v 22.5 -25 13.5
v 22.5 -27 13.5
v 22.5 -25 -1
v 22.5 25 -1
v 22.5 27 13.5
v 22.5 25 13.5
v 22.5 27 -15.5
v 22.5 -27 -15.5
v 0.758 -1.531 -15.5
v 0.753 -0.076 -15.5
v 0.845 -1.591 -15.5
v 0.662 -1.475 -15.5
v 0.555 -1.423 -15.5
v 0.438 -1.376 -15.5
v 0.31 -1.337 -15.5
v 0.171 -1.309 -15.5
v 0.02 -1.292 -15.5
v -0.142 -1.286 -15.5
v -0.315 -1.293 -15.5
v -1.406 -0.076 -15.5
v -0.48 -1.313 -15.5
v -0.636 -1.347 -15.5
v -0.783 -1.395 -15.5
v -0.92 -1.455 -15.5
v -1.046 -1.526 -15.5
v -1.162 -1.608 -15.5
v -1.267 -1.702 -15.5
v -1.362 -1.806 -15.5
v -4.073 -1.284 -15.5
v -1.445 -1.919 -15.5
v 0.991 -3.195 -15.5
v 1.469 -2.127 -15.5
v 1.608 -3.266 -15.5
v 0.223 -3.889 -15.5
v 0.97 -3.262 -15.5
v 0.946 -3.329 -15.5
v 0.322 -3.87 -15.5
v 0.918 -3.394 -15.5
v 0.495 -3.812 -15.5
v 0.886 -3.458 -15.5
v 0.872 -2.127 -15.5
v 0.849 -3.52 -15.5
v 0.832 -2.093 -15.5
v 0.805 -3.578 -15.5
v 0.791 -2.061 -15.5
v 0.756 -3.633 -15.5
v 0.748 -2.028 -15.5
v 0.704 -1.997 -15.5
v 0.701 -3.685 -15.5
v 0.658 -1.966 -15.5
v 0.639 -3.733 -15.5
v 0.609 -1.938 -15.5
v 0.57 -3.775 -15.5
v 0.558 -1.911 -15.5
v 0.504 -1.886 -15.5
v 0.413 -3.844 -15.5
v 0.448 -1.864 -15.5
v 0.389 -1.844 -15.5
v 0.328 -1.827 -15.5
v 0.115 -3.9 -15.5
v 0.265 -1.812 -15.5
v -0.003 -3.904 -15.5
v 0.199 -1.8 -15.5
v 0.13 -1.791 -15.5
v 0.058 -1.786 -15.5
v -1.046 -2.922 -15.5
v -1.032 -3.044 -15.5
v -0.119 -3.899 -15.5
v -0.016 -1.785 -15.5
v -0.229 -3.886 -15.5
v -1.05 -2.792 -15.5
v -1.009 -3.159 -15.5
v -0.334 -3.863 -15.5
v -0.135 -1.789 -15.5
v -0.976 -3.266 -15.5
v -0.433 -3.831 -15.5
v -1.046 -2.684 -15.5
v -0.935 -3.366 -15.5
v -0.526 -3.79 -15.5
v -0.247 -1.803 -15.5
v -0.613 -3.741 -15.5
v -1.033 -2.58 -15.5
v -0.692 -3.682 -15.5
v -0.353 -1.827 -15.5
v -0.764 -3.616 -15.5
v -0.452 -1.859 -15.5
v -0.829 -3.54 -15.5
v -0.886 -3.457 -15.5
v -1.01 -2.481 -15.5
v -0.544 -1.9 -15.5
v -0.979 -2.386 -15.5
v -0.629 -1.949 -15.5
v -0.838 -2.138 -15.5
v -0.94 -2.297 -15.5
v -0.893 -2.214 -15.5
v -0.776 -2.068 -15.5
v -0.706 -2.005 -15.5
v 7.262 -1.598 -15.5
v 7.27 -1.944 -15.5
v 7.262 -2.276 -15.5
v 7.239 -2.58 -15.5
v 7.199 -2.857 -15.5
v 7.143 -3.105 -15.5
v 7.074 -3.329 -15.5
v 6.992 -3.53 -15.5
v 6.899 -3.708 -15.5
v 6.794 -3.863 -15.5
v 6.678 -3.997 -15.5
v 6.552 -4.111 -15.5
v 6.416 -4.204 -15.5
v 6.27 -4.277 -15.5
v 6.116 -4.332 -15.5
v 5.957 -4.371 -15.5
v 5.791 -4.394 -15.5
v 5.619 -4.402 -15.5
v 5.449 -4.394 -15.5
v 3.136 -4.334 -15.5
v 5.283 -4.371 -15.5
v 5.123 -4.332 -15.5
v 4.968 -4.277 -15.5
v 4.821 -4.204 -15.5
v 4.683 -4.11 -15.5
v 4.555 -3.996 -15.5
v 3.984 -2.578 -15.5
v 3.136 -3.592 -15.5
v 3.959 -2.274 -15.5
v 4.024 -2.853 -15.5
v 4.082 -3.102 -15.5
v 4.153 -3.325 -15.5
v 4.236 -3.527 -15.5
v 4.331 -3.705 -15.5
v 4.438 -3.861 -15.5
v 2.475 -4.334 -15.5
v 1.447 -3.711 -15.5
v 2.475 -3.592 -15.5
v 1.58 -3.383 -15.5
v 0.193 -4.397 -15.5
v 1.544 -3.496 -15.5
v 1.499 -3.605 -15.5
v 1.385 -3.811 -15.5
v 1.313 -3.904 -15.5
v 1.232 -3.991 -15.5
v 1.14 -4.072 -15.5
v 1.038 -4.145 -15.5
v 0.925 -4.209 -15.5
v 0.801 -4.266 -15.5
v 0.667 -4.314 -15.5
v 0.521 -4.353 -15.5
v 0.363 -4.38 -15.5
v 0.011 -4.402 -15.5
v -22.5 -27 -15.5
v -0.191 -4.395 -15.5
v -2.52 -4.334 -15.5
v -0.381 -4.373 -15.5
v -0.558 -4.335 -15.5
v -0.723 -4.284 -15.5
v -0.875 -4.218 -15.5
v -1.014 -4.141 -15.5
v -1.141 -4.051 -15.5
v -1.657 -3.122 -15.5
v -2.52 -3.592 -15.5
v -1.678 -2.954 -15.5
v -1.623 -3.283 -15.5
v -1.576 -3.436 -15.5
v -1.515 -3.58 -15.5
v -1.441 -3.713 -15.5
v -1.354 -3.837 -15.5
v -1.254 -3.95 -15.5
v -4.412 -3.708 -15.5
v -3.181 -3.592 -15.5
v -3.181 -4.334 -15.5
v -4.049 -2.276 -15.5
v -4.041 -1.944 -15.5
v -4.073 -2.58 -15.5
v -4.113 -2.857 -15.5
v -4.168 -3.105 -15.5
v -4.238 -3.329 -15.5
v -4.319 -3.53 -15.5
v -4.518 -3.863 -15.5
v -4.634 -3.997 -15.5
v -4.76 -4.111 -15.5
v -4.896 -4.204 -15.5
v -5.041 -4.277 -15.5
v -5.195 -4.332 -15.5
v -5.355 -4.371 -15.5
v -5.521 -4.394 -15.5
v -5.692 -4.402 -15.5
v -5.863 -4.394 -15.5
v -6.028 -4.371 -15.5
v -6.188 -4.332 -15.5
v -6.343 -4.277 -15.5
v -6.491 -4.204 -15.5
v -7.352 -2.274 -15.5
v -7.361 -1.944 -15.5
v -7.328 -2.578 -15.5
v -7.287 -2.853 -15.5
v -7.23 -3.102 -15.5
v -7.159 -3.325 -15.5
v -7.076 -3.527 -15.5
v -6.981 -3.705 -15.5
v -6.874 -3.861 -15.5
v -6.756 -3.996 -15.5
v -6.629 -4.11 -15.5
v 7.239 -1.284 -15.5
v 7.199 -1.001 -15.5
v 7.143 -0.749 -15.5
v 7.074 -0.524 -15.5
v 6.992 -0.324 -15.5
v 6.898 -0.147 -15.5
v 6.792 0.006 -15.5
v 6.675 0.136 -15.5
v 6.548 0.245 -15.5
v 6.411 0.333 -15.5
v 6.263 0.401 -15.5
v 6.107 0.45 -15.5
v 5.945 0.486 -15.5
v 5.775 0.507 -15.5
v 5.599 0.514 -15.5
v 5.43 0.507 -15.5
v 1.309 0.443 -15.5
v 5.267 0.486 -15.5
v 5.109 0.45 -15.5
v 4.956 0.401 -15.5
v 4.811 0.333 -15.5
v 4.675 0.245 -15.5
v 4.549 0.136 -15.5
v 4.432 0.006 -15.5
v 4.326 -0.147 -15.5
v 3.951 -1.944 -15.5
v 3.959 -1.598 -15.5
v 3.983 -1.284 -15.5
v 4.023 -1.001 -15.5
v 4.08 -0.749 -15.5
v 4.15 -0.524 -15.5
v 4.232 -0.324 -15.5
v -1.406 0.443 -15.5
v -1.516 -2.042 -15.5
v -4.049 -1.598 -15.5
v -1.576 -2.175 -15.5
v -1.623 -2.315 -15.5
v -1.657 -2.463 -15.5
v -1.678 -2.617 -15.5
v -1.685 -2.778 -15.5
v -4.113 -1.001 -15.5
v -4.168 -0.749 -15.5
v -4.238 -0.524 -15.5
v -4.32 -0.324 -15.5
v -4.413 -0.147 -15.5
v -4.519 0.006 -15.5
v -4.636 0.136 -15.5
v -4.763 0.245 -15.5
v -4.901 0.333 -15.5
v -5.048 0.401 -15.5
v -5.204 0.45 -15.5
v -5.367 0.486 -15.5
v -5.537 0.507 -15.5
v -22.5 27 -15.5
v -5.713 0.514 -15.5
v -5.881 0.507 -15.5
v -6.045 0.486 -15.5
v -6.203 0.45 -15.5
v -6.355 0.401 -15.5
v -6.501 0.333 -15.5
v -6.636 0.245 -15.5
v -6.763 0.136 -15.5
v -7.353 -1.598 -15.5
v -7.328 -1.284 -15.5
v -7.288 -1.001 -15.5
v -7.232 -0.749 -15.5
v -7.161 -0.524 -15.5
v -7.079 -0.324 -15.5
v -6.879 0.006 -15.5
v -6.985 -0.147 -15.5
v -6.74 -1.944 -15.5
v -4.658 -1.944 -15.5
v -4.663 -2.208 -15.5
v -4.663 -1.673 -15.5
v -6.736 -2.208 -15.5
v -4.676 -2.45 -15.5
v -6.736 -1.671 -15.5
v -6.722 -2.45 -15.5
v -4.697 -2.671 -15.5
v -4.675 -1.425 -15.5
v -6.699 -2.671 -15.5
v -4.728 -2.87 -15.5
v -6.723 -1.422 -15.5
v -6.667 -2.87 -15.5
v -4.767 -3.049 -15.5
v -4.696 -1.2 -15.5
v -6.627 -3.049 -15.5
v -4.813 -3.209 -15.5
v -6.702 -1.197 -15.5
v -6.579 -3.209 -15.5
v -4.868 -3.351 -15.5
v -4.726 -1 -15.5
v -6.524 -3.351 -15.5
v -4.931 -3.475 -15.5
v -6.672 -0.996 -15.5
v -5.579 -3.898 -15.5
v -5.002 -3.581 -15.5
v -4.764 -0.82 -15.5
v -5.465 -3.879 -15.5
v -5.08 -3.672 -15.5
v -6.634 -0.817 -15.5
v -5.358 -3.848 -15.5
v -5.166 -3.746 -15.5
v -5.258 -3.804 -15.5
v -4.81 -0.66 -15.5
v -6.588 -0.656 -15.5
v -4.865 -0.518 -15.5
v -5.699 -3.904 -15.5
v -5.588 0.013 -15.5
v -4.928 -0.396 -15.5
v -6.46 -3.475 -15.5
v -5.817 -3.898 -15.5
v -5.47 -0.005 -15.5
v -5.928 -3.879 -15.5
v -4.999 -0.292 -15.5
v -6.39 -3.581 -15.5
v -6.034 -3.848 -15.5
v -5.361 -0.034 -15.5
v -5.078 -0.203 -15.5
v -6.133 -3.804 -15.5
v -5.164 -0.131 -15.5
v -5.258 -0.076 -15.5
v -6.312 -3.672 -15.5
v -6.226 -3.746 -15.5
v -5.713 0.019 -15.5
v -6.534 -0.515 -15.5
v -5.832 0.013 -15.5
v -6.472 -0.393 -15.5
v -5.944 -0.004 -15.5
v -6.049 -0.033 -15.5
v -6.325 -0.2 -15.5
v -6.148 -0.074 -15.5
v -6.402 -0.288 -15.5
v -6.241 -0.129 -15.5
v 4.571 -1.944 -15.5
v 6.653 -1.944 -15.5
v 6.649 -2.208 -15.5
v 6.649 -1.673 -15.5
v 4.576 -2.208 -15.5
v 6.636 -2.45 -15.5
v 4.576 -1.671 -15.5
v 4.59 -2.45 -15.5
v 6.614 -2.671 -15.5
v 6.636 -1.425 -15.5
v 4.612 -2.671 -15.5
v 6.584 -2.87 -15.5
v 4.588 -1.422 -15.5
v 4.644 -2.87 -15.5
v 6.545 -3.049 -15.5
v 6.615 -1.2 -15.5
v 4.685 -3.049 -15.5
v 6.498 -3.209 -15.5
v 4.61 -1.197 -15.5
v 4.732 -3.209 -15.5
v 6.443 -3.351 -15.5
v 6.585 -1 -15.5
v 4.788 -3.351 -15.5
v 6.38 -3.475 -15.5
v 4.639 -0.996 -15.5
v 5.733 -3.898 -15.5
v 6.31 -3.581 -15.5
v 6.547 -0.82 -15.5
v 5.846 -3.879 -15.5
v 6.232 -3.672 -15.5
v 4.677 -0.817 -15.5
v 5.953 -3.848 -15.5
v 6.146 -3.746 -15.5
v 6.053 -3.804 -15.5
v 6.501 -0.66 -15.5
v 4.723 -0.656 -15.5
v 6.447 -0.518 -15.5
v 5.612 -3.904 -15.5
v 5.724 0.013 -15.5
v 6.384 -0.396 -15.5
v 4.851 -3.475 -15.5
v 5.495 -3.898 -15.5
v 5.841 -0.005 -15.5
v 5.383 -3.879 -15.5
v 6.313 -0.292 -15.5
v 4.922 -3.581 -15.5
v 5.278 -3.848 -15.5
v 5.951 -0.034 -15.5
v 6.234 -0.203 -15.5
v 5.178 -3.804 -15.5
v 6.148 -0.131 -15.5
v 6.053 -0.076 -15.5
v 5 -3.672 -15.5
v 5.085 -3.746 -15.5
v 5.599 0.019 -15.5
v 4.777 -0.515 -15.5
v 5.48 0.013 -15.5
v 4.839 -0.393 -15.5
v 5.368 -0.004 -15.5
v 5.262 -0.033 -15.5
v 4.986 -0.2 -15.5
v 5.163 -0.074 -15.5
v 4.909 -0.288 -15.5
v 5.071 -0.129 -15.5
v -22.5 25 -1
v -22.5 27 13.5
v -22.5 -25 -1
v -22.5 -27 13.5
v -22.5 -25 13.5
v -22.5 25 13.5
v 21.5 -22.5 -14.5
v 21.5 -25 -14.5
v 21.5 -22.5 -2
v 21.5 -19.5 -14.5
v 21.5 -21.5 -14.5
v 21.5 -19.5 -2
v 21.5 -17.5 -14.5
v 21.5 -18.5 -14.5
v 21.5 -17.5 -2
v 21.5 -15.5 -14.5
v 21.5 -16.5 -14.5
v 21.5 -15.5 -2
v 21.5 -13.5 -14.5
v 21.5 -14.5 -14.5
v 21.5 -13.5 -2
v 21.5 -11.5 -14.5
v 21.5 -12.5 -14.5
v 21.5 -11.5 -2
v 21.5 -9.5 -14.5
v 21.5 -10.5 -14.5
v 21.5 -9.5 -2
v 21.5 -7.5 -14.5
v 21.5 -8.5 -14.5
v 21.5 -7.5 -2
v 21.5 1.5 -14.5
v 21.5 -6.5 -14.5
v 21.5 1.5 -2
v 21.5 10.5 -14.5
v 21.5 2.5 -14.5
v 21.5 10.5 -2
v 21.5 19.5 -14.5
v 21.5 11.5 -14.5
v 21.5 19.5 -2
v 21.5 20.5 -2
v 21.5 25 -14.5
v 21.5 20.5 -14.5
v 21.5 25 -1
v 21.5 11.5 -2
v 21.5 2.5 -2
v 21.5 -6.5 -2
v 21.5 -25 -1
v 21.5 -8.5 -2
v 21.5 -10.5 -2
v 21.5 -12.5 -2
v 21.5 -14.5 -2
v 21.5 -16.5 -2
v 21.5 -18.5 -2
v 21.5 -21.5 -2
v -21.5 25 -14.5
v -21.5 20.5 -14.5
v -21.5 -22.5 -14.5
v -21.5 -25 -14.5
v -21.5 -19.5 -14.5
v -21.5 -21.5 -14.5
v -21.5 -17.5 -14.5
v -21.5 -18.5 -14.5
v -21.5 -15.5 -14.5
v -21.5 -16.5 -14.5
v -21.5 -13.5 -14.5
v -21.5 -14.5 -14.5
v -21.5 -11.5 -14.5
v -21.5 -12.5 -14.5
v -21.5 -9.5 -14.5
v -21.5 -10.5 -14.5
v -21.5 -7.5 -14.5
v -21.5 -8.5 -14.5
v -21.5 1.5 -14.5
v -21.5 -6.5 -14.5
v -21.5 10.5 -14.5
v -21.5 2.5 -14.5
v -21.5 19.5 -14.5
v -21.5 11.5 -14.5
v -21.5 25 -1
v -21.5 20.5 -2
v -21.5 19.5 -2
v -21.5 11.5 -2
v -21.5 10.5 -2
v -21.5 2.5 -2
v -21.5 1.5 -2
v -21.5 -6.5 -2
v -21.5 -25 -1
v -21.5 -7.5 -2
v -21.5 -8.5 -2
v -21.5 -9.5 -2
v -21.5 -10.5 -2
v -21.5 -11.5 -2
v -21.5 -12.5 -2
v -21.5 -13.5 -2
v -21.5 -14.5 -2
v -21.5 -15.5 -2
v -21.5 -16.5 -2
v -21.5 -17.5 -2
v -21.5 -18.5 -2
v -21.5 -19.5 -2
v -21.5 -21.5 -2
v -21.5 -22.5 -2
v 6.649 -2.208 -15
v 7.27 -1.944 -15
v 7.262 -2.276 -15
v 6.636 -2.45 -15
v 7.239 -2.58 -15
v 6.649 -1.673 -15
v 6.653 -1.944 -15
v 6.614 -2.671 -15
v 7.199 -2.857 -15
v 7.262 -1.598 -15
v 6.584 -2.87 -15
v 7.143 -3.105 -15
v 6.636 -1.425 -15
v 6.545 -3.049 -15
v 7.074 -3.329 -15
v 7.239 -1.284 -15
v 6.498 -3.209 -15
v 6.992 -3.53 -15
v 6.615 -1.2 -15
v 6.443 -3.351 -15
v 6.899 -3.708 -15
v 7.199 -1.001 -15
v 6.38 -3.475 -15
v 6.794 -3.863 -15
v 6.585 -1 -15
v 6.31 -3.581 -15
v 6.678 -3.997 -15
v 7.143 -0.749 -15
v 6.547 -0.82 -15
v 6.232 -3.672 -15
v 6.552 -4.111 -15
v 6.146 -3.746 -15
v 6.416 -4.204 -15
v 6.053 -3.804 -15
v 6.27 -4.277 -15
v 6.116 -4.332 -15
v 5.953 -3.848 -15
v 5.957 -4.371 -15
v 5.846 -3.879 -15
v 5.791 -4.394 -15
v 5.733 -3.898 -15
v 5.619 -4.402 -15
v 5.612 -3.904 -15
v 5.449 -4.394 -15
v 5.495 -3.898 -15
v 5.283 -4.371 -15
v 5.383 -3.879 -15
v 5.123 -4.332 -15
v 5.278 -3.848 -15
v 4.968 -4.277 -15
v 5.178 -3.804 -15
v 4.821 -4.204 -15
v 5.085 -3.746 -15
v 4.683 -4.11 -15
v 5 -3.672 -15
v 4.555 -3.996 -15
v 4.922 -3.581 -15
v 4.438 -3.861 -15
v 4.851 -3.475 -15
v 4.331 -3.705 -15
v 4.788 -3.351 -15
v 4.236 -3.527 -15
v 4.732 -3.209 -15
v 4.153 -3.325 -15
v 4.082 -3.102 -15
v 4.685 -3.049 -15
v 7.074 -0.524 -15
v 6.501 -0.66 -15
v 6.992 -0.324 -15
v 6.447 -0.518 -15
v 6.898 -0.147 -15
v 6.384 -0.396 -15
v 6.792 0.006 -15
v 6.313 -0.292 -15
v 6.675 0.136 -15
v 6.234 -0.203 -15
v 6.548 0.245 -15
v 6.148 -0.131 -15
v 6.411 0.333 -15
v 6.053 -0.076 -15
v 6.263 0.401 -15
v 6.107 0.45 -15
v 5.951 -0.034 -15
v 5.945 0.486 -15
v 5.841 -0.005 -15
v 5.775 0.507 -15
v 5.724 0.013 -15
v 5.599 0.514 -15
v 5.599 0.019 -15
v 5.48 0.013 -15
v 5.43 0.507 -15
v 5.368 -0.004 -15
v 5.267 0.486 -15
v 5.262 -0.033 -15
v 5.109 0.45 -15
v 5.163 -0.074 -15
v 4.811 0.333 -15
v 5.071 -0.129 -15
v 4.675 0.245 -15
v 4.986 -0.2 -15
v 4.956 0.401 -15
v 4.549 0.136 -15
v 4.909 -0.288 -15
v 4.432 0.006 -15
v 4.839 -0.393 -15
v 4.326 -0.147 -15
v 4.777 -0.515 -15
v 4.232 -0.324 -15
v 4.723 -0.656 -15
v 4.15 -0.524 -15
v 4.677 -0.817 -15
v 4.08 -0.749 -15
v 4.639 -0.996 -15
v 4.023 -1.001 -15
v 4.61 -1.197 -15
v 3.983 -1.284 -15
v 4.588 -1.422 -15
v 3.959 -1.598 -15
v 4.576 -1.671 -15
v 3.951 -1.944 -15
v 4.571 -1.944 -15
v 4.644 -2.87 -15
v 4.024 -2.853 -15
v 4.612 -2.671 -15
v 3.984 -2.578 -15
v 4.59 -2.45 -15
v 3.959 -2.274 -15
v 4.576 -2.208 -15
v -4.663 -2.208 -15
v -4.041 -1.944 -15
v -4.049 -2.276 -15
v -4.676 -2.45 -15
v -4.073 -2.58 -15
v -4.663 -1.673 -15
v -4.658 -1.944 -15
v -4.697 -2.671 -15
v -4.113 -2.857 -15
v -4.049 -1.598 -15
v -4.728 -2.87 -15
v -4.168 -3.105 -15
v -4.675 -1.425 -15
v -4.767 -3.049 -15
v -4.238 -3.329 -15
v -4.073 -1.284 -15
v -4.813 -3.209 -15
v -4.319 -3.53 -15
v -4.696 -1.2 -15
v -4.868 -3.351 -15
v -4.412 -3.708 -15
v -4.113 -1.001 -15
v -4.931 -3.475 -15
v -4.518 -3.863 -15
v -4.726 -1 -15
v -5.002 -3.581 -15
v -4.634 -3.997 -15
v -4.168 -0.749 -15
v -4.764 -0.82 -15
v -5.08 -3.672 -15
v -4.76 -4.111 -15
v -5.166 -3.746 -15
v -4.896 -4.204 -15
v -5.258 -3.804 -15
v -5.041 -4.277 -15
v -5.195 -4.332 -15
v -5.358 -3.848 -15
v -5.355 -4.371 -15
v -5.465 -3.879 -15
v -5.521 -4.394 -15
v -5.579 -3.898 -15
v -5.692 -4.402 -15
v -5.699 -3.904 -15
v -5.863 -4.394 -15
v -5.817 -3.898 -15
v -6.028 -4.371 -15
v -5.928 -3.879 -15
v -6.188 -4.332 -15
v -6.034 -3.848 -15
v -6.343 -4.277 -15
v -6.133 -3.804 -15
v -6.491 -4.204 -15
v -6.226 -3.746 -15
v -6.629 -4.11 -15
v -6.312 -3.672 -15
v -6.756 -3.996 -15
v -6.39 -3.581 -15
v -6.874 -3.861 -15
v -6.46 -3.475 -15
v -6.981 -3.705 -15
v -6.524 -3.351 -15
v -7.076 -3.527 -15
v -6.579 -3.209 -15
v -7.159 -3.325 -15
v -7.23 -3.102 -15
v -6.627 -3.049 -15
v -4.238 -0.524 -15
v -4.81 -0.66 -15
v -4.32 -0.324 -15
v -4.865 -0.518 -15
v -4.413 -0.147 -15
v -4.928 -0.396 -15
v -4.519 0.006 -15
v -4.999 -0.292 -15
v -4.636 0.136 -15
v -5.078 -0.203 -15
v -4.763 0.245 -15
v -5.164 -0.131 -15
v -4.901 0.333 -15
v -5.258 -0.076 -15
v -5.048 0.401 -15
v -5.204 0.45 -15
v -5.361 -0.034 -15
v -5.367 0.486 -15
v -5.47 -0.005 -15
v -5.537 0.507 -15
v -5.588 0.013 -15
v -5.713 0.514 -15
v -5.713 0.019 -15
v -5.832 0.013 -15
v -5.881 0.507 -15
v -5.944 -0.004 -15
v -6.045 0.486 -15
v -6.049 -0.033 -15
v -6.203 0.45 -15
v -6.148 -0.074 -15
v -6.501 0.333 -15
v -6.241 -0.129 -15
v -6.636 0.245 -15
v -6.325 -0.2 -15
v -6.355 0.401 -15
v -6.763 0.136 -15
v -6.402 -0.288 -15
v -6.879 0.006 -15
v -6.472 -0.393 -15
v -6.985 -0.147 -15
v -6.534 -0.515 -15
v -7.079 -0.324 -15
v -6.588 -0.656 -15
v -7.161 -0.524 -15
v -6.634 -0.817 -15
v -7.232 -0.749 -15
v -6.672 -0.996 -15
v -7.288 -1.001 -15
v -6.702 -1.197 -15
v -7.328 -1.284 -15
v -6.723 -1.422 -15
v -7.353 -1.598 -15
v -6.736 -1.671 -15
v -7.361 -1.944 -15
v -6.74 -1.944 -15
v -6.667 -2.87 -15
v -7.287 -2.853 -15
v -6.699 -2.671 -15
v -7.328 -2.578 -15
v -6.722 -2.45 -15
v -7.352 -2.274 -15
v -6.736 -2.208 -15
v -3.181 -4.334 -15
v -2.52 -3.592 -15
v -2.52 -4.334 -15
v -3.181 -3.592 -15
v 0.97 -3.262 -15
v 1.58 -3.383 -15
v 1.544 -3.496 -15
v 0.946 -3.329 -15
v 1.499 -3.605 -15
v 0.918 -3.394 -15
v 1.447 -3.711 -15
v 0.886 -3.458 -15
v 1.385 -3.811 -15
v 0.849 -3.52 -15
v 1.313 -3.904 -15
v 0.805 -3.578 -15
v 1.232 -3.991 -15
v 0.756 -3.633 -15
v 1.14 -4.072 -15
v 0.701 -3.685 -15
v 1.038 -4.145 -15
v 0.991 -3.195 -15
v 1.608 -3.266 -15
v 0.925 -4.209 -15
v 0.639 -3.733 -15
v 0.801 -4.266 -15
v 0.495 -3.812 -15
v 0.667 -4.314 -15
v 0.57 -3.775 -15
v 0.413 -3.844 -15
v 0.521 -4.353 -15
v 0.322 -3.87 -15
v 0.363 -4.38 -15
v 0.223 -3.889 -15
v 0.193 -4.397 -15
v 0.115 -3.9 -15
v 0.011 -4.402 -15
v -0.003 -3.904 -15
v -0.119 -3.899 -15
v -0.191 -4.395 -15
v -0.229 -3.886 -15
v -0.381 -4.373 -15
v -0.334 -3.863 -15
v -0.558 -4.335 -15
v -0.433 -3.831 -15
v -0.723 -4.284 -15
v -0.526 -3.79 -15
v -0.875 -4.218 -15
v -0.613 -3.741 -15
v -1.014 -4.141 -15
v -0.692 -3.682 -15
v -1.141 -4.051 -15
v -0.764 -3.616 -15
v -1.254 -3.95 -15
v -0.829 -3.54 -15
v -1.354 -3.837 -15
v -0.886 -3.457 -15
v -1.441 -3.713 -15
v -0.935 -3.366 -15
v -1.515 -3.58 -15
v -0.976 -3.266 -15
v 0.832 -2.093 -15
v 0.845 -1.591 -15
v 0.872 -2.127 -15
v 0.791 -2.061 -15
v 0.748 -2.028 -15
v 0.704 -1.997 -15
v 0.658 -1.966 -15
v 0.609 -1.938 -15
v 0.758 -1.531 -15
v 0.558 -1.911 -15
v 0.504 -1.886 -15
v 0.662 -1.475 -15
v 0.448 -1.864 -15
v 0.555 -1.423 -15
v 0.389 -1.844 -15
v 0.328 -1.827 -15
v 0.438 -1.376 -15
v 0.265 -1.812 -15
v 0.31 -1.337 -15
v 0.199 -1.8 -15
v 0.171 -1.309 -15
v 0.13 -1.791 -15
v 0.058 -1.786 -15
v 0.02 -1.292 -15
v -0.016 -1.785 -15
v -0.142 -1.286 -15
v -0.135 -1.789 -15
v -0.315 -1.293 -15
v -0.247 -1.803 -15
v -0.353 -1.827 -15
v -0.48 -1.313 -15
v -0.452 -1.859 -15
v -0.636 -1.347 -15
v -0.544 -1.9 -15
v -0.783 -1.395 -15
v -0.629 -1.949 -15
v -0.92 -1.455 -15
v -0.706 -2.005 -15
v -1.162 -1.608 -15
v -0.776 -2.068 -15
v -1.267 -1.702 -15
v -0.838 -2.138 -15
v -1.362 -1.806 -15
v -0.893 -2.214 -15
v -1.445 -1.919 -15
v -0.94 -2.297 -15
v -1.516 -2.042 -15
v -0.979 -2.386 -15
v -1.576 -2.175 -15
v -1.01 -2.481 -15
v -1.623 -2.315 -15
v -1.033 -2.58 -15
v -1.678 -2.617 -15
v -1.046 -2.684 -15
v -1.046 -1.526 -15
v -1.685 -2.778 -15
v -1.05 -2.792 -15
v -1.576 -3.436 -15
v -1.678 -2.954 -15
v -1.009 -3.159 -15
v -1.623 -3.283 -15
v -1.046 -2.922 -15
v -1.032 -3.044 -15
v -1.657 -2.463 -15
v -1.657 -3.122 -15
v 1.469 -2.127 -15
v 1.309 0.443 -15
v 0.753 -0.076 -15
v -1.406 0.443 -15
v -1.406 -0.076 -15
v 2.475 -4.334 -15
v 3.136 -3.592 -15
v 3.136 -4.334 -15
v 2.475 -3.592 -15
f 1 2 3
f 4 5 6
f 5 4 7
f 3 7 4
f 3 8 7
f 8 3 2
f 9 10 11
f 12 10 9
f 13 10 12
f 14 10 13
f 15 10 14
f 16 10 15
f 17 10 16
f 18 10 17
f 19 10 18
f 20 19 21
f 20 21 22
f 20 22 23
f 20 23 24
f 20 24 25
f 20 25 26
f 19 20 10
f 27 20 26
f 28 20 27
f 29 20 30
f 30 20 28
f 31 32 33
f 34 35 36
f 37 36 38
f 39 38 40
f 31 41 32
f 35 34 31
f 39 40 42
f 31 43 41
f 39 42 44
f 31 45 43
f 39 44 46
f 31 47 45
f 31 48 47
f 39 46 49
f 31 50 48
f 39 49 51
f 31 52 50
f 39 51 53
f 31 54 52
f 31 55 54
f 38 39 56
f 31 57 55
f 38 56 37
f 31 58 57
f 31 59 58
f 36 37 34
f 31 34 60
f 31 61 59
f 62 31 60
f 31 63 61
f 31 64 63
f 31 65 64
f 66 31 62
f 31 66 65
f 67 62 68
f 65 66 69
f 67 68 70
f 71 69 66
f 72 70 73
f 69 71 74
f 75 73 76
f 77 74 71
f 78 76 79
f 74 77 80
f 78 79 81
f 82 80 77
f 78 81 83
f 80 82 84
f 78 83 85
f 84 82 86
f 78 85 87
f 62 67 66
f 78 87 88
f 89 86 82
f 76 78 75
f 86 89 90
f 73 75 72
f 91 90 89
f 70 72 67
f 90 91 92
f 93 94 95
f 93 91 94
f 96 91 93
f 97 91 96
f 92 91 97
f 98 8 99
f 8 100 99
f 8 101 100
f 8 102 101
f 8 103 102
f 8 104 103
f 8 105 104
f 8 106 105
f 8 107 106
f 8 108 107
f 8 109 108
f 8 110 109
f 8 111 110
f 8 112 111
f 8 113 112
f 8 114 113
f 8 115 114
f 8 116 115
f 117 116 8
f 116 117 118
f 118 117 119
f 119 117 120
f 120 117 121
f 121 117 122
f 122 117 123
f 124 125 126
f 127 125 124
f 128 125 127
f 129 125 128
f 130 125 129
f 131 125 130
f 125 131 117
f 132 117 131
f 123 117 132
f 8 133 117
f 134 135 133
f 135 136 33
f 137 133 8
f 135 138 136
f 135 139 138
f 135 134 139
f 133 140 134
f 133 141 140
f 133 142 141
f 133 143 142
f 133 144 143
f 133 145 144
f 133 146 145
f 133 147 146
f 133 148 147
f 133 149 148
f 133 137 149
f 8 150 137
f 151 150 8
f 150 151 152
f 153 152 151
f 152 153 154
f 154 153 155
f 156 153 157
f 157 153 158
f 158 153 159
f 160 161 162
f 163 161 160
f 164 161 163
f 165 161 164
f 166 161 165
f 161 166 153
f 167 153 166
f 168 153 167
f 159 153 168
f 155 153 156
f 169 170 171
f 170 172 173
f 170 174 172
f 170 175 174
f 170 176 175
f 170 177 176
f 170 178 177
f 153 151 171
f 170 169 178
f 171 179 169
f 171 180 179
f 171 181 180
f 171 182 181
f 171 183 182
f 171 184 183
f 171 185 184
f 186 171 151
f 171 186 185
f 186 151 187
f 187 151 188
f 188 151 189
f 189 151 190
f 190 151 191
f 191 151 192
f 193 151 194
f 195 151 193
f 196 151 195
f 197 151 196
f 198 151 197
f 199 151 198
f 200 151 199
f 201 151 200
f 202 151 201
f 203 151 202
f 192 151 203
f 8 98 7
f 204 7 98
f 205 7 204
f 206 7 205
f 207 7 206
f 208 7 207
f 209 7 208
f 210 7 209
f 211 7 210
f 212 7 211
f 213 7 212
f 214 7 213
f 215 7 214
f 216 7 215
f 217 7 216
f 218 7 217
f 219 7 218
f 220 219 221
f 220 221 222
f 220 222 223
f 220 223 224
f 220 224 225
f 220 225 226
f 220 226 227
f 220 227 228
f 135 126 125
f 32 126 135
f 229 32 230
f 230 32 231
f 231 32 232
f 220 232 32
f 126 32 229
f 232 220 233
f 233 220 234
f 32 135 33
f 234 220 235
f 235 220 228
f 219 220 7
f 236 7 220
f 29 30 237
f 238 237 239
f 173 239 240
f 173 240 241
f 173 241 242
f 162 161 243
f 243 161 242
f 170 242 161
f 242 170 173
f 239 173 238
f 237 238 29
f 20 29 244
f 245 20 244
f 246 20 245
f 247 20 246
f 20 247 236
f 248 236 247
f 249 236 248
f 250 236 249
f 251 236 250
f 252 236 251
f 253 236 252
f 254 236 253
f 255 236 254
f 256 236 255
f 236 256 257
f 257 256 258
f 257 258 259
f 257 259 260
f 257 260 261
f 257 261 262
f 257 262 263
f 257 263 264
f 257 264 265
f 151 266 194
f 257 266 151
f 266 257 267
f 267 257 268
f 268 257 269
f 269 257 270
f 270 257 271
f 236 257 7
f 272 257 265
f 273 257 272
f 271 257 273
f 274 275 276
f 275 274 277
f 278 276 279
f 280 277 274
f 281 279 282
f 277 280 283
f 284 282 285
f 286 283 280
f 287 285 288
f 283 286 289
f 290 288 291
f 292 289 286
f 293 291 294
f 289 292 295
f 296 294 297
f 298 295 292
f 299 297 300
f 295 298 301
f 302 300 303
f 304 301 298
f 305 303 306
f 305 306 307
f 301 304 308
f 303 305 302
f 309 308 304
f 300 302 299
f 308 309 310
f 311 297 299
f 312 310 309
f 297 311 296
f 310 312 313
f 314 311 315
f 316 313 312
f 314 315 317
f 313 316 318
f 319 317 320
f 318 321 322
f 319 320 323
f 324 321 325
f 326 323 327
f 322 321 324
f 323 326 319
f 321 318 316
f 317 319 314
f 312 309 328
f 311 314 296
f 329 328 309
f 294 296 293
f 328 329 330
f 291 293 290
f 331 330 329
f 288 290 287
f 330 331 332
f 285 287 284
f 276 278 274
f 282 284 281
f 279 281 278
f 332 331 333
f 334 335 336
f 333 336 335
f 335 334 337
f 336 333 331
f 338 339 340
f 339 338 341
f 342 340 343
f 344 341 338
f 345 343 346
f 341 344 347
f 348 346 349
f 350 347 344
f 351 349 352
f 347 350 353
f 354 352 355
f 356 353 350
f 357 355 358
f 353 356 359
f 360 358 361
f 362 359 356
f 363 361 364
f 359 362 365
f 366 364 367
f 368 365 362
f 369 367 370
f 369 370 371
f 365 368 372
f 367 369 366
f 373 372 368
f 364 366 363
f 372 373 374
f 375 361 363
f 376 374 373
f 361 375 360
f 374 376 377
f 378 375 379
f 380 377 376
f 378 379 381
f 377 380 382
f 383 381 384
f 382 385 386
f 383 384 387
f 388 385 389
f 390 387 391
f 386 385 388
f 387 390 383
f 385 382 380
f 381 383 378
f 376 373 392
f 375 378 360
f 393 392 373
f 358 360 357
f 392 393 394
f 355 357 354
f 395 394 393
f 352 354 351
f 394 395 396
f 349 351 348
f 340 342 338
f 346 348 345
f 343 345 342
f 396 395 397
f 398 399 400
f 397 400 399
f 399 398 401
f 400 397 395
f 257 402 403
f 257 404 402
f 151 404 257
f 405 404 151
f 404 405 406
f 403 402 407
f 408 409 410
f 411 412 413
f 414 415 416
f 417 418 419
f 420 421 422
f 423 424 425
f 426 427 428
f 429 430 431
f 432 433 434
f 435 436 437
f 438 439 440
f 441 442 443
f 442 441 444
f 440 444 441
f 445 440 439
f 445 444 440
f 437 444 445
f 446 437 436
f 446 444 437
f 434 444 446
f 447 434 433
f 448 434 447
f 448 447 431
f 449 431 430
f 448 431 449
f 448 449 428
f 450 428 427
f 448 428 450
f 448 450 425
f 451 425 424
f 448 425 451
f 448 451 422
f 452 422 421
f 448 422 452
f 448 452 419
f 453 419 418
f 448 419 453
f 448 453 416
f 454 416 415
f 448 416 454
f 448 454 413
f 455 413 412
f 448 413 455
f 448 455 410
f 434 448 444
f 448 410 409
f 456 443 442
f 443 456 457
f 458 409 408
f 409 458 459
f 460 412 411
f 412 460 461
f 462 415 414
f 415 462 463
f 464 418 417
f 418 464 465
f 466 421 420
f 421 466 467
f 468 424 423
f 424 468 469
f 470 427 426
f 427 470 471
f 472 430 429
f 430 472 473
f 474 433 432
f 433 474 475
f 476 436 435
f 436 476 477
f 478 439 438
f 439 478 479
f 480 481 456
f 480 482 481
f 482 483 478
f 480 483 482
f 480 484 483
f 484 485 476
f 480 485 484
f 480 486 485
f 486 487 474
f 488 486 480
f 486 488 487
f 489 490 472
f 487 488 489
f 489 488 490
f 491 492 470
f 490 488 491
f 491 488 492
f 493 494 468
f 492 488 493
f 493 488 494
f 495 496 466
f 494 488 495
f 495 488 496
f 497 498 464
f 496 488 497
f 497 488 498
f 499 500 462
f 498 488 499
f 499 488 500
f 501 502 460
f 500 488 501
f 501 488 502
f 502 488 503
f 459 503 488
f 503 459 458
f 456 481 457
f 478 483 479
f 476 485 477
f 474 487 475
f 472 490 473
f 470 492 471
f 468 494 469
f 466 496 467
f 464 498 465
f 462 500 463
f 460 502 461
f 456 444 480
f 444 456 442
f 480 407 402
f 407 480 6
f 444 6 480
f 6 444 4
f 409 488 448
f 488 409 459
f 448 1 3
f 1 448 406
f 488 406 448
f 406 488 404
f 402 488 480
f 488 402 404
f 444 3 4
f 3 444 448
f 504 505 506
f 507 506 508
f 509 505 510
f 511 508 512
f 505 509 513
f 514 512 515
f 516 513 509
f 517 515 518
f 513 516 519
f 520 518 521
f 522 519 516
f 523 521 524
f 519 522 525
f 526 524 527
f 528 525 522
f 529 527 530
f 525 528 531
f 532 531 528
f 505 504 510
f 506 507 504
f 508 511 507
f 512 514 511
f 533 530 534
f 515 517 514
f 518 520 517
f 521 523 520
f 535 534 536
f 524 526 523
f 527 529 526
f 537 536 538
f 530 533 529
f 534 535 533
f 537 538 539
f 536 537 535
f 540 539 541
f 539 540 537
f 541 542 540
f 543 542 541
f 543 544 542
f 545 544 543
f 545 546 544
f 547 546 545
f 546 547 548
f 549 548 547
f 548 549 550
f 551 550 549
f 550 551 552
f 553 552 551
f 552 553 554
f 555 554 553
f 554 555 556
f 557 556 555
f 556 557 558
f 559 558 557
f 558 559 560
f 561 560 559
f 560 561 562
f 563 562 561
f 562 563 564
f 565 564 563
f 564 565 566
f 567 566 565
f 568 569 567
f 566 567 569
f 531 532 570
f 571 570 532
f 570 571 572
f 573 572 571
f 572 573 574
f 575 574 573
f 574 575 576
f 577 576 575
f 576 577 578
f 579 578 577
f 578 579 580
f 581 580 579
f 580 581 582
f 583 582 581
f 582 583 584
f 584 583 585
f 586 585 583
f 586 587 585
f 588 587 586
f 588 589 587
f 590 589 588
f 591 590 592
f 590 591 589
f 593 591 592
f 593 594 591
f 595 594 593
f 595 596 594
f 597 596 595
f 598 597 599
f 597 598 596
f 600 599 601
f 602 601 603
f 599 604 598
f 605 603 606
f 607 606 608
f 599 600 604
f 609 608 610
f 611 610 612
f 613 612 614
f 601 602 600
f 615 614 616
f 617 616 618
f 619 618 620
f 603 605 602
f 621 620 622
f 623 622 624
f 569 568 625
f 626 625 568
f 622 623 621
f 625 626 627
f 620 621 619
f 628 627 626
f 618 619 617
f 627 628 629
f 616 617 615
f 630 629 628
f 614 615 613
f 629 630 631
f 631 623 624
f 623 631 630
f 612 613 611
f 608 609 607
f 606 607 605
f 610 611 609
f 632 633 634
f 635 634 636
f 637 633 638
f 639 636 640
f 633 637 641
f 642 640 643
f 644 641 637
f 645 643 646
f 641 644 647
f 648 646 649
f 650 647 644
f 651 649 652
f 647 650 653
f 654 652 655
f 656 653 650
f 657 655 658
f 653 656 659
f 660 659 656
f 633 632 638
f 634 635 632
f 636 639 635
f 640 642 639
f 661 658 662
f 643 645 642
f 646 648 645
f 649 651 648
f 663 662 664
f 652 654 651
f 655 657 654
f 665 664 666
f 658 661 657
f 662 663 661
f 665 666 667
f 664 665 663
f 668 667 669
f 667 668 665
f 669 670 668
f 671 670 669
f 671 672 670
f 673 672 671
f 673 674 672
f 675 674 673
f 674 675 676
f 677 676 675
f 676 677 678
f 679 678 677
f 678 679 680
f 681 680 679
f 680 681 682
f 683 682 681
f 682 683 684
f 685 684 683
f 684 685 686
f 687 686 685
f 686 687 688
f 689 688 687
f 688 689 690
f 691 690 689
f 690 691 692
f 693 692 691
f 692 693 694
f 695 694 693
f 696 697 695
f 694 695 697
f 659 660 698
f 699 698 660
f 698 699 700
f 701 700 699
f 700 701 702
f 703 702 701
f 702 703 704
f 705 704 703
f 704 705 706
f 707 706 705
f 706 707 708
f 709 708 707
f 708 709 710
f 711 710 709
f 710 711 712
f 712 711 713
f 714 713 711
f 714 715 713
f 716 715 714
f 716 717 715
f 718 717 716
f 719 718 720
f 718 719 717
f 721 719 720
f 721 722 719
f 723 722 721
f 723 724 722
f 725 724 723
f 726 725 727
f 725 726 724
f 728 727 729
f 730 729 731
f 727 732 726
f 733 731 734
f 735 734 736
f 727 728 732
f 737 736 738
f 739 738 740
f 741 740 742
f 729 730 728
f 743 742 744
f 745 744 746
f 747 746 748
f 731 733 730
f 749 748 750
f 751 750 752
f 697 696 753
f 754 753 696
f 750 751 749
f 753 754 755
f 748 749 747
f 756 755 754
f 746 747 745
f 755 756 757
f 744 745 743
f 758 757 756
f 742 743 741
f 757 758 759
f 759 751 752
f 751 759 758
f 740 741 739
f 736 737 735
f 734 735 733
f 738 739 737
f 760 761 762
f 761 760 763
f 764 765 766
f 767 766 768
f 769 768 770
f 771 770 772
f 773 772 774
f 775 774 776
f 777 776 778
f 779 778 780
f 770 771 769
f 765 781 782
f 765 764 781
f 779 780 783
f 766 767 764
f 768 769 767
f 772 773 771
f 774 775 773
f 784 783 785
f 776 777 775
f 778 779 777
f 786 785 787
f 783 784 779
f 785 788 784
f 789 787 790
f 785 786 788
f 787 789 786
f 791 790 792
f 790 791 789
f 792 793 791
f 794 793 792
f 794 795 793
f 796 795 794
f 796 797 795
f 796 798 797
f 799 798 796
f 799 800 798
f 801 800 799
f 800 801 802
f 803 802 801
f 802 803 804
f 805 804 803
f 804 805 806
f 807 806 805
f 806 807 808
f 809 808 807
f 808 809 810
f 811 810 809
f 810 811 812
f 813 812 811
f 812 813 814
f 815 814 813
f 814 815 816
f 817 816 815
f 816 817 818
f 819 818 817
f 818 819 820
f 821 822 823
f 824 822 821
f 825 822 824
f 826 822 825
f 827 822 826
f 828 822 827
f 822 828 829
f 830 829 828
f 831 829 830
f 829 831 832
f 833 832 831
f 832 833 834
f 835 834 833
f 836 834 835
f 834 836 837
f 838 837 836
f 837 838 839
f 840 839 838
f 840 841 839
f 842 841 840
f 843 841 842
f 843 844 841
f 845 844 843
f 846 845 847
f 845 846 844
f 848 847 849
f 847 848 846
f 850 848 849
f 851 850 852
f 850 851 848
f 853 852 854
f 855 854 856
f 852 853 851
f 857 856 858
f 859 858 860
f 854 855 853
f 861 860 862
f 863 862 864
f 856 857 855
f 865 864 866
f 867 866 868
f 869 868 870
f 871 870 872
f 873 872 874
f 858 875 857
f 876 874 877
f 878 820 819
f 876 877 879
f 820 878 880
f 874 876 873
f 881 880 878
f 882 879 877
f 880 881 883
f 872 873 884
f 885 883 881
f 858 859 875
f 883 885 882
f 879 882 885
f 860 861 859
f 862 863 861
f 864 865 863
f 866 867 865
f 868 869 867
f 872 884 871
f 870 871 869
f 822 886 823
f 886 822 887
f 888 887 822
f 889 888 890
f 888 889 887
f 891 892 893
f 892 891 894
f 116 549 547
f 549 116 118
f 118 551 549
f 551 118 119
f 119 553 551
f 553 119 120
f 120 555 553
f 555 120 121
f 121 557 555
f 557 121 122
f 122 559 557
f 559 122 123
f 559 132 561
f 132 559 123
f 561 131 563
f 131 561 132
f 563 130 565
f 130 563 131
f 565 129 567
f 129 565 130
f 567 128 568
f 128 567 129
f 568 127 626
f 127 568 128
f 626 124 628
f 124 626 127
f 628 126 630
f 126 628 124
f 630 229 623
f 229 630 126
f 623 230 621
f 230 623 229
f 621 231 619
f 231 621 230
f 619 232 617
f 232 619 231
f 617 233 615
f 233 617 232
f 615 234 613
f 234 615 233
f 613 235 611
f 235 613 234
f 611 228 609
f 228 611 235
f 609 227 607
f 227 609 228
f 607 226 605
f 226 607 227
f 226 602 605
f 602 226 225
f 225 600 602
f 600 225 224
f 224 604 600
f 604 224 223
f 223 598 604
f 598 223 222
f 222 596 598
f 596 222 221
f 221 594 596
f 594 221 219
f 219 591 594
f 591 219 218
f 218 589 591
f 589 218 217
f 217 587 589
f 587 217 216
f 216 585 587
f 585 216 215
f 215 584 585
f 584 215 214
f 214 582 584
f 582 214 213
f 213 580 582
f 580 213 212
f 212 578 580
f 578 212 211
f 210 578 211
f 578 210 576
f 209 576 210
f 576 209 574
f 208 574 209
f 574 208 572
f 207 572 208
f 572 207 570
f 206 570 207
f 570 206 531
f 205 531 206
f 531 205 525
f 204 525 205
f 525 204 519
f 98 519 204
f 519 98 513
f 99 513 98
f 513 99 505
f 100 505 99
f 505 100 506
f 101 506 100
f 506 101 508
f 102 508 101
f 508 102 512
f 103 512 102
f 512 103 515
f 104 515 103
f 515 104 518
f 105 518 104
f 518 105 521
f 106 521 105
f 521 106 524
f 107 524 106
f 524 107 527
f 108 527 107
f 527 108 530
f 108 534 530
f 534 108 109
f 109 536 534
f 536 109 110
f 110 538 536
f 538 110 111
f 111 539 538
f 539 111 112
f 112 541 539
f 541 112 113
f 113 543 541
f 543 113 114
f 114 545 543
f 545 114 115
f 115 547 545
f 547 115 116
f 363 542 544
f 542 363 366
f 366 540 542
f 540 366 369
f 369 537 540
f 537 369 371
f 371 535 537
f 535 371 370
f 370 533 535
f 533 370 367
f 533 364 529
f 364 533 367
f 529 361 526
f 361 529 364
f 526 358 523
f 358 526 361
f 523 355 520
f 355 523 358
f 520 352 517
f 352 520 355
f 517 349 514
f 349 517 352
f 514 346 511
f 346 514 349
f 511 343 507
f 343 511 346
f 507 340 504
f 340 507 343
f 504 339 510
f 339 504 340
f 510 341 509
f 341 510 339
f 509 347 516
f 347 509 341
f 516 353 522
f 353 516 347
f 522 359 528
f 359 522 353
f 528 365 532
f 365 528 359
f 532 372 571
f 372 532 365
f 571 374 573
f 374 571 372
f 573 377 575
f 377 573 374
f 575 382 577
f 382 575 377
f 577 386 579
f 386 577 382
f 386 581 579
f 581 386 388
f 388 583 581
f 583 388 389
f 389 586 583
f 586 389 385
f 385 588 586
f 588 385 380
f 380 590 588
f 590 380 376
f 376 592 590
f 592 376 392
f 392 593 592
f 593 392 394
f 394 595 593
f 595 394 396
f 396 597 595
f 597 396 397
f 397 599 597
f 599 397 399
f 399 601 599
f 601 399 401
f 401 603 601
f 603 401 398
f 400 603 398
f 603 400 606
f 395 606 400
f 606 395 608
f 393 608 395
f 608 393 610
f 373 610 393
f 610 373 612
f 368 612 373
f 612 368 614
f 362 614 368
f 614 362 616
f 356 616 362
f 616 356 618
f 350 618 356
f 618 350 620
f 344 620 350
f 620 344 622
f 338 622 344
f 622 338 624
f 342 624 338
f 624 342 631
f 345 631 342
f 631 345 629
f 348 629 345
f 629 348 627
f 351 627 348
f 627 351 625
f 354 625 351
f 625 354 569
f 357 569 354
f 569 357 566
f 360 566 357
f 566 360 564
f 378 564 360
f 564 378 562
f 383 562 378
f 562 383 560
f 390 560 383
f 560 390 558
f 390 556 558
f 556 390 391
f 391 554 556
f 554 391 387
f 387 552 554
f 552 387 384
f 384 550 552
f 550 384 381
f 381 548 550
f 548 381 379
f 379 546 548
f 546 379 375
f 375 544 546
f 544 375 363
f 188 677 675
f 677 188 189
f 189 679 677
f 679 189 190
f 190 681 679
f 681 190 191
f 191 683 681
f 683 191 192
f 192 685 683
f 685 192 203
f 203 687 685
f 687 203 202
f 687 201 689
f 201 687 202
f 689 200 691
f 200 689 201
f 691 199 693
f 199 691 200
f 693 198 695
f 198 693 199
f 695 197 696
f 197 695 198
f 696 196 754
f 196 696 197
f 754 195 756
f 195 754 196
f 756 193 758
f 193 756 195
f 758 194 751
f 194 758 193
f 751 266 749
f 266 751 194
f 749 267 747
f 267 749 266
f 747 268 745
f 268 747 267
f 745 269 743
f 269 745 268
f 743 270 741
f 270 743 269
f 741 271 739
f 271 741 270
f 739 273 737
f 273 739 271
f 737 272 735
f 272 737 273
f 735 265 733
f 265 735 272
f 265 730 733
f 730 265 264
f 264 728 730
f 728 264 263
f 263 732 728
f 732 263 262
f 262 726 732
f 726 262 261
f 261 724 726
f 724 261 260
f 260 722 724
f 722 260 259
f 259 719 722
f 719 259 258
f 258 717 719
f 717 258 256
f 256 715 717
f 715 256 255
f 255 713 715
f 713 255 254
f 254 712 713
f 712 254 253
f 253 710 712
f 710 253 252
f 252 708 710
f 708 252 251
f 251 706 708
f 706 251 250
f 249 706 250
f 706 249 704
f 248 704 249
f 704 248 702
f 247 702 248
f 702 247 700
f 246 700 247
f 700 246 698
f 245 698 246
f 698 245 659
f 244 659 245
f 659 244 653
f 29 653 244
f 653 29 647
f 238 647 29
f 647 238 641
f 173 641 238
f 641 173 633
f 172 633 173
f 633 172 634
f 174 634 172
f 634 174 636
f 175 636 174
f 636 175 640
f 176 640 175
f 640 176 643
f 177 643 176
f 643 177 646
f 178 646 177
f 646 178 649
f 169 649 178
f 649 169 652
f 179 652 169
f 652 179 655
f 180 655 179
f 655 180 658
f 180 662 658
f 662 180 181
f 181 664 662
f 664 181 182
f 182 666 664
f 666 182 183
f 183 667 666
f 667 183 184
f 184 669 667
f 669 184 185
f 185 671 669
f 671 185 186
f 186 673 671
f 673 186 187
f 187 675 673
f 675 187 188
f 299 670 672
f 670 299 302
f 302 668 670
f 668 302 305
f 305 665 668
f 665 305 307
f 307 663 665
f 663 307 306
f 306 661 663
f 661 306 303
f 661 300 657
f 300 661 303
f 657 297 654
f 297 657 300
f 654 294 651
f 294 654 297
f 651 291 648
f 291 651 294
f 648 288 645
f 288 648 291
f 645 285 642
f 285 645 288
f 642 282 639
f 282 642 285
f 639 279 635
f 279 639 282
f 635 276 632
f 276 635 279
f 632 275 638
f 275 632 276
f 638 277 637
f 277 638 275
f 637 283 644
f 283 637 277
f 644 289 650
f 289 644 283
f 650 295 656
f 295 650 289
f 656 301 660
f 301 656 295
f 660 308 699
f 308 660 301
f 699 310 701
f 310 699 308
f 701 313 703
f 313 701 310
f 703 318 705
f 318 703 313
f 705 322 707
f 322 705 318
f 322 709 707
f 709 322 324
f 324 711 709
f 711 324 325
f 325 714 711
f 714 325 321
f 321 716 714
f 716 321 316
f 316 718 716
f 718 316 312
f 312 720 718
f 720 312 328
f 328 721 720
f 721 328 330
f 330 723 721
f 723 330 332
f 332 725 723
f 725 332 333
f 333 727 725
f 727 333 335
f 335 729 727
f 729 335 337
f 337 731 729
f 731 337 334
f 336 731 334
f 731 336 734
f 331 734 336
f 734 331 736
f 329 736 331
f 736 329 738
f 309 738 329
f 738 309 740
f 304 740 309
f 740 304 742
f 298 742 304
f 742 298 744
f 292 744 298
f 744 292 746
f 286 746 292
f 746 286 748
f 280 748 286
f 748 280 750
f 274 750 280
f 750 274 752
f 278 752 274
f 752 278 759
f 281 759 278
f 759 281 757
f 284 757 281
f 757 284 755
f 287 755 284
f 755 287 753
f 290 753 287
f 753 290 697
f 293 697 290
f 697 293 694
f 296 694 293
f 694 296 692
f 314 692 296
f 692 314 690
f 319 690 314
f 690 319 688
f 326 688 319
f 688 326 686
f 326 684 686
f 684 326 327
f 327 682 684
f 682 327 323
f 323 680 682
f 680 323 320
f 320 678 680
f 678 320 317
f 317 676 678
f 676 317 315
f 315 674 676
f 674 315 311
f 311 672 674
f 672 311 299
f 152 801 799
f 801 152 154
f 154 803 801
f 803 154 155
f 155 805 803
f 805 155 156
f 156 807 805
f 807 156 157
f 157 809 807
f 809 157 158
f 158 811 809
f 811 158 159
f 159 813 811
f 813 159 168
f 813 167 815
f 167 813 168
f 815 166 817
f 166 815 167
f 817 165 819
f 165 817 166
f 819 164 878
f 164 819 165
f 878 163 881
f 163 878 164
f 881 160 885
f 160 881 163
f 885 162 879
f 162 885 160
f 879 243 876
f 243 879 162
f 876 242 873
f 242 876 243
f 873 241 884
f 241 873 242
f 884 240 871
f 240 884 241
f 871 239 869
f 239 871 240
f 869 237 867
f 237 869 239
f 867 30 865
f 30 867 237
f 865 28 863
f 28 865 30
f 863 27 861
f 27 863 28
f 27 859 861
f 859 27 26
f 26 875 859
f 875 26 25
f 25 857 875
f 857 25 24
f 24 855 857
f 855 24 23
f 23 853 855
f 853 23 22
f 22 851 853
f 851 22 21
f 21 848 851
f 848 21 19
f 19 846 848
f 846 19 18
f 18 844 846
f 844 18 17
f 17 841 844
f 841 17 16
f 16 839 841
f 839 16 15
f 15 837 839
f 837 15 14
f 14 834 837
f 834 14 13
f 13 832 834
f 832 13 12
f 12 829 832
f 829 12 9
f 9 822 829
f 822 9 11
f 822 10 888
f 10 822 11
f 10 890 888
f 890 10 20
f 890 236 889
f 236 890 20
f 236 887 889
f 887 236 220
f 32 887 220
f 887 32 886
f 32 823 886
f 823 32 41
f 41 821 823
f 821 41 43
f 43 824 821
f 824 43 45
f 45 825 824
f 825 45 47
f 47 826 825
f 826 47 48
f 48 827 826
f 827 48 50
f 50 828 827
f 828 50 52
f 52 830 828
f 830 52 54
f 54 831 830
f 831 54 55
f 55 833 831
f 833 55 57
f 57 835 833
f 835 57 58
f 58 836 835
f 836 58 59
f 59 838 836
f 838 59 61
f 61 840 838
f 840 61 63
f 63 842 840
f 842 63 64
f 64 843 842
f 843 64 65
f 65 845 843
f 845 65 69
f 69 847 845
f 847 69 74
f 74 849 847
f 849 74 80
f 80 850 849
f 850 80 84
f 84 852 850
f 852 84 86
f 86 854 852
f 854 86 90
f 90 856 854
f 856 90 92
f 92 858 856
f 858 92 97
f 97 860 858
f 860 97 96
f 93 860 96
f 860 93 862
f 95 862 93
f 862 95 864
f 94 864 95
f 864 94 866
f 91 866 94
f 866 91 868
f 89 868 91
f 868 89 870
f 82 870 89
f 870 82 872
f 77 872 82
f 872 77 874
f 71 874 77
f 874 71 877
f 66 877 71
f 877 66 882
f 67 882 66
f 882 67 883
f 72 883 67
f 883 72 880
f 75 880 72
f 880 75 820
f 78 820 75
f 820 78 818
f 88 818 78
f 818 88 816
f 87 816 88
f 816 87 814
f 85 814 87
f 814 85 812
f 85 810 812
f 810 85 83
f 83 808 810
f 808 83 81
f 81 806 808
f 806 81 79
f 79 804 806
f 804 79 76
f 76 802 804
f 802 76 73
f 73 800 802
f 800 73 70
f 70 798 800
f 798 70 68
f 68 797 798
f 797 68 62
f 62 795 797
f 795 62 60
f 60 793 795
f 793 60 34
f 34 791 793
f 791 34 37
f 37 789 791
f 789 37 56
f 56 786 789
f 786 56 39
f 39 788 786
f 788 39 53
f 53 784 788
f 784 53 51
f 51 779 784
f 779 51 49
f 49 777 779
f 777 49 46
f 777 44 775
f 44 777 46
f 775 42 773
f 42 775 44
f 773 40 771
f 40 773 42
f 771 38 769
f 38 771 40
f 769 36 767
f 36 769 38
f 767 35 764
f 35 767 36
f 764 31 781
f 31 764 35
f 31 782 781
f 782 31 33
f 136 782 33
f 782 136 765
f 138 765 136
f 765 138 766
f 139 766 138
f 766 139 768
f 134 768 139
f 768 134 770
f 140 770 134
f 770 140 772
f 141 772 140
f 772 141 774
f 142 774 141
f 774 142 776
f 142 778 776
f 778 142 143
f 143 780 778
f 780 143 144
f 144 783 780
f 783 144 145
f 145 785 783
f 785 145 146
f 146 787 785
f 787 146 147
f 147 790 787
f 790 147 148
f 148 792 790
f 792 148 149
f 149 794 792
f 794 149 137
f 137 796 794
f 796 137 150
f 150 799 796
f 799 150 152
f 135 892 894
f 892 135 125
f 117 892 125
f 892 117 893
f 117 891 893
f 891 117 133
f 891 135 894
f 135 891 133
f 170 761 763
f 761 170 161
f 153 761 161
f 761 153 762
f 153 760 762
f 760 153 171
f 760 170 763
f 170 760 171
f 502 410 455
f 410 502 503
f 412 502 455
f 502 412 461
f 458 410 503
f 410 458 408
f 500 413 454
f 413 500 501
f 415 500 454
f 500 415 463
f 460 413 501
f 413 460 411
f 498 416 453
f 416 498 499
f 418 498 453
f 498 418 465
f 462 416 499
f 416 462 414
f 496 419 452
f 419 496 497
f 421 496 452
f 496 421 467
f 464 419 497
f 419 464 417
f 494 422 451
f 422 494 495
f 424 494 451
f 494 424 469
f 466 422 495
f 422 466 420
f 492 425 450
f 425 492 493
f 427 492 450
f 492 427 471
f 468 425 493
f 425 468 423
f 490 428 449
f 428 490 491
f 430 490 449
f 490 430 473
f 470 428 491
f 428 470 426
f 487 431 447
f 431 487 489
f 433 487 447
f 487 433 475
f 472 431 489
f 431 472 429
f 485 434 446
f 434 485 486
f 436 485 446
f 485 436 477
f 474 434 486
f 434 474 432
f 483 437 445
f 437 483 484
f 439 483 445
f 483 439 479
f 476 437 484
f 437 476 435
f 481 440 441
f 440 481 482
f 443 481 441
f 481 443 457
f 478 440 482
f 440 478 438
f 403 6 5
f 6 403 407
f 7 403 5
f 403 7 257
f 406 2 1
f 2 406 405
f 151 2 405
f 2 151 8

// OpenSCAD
// 1 unit = 1/16"

version = "0.5.0";

function toUnits(inches, sixteenths) = (inches * 16) + sixteenths;

slots = [2,2,1,1,1,1,1,1,8,8,8,5];
cardWidth = toUnits(1, 12);
cardLength = toUnits(2, 10);

channelWidth = cardLength + 1;
channelHeight = cardWidth + 1;
channelLength = 50 ;

trayWidth = channelWidth + 2;
trayHeight = channelHeight + 2;
trayLength = channelLength + 2;

ribHeigh = (trayHeight / 2) - 2;

endcapHeight = cardWidth + 1;
endcapThickness = 2;



module rib() {
    translate ([0, 0, -(ribHeigh) / 2]) cube ([trayWidth,1, ribHeigh], true);
}

module endCap() {
    cube ([trayWidth, endcapThickness, endcapHeight], true);
}

%cube([cardLength, 0.5, cardWidth], true); // sample card

// recursive sum function on an array
// v = vector
// i = current index
// e = end index
// r = return value
function sum(v, i=0, e=0, r=0) = i<=e ? sum(v, i+1, e, r+v[i]) : r;

module layoutRibs() {
    for (i = [0: len(slots) - 1] ) {
        y = sum(slots, 0, i);
        translate ([0, - (channelLength / 2) + 1,-1]) translate ([0,y + i,-1]) rib();
    };
}

difference() {
    cube ([trayWidth, trayLength, trayHeight], true);
    cube ([channelWidth, channelLength, channelHeight], true);
    translate ([0, 0, trayHeight / 2 ]) cube ([trayWidth + 2, trayLength+ 2, trayHeight+2], true);
    translate ([0, -2, - ribHeigh - 1.5])
        rotate ([0,180,0])
            linear_extrude (2) {
                scale (.5, .5, .5)
                text(version, halign = "center", valign = "center");
            } ;
};



translate ([0, trayLength / 2, -1] ) endCap();
translate ([0, -(trayLength / 2), -1] ) endCap();



layoutRibs();
